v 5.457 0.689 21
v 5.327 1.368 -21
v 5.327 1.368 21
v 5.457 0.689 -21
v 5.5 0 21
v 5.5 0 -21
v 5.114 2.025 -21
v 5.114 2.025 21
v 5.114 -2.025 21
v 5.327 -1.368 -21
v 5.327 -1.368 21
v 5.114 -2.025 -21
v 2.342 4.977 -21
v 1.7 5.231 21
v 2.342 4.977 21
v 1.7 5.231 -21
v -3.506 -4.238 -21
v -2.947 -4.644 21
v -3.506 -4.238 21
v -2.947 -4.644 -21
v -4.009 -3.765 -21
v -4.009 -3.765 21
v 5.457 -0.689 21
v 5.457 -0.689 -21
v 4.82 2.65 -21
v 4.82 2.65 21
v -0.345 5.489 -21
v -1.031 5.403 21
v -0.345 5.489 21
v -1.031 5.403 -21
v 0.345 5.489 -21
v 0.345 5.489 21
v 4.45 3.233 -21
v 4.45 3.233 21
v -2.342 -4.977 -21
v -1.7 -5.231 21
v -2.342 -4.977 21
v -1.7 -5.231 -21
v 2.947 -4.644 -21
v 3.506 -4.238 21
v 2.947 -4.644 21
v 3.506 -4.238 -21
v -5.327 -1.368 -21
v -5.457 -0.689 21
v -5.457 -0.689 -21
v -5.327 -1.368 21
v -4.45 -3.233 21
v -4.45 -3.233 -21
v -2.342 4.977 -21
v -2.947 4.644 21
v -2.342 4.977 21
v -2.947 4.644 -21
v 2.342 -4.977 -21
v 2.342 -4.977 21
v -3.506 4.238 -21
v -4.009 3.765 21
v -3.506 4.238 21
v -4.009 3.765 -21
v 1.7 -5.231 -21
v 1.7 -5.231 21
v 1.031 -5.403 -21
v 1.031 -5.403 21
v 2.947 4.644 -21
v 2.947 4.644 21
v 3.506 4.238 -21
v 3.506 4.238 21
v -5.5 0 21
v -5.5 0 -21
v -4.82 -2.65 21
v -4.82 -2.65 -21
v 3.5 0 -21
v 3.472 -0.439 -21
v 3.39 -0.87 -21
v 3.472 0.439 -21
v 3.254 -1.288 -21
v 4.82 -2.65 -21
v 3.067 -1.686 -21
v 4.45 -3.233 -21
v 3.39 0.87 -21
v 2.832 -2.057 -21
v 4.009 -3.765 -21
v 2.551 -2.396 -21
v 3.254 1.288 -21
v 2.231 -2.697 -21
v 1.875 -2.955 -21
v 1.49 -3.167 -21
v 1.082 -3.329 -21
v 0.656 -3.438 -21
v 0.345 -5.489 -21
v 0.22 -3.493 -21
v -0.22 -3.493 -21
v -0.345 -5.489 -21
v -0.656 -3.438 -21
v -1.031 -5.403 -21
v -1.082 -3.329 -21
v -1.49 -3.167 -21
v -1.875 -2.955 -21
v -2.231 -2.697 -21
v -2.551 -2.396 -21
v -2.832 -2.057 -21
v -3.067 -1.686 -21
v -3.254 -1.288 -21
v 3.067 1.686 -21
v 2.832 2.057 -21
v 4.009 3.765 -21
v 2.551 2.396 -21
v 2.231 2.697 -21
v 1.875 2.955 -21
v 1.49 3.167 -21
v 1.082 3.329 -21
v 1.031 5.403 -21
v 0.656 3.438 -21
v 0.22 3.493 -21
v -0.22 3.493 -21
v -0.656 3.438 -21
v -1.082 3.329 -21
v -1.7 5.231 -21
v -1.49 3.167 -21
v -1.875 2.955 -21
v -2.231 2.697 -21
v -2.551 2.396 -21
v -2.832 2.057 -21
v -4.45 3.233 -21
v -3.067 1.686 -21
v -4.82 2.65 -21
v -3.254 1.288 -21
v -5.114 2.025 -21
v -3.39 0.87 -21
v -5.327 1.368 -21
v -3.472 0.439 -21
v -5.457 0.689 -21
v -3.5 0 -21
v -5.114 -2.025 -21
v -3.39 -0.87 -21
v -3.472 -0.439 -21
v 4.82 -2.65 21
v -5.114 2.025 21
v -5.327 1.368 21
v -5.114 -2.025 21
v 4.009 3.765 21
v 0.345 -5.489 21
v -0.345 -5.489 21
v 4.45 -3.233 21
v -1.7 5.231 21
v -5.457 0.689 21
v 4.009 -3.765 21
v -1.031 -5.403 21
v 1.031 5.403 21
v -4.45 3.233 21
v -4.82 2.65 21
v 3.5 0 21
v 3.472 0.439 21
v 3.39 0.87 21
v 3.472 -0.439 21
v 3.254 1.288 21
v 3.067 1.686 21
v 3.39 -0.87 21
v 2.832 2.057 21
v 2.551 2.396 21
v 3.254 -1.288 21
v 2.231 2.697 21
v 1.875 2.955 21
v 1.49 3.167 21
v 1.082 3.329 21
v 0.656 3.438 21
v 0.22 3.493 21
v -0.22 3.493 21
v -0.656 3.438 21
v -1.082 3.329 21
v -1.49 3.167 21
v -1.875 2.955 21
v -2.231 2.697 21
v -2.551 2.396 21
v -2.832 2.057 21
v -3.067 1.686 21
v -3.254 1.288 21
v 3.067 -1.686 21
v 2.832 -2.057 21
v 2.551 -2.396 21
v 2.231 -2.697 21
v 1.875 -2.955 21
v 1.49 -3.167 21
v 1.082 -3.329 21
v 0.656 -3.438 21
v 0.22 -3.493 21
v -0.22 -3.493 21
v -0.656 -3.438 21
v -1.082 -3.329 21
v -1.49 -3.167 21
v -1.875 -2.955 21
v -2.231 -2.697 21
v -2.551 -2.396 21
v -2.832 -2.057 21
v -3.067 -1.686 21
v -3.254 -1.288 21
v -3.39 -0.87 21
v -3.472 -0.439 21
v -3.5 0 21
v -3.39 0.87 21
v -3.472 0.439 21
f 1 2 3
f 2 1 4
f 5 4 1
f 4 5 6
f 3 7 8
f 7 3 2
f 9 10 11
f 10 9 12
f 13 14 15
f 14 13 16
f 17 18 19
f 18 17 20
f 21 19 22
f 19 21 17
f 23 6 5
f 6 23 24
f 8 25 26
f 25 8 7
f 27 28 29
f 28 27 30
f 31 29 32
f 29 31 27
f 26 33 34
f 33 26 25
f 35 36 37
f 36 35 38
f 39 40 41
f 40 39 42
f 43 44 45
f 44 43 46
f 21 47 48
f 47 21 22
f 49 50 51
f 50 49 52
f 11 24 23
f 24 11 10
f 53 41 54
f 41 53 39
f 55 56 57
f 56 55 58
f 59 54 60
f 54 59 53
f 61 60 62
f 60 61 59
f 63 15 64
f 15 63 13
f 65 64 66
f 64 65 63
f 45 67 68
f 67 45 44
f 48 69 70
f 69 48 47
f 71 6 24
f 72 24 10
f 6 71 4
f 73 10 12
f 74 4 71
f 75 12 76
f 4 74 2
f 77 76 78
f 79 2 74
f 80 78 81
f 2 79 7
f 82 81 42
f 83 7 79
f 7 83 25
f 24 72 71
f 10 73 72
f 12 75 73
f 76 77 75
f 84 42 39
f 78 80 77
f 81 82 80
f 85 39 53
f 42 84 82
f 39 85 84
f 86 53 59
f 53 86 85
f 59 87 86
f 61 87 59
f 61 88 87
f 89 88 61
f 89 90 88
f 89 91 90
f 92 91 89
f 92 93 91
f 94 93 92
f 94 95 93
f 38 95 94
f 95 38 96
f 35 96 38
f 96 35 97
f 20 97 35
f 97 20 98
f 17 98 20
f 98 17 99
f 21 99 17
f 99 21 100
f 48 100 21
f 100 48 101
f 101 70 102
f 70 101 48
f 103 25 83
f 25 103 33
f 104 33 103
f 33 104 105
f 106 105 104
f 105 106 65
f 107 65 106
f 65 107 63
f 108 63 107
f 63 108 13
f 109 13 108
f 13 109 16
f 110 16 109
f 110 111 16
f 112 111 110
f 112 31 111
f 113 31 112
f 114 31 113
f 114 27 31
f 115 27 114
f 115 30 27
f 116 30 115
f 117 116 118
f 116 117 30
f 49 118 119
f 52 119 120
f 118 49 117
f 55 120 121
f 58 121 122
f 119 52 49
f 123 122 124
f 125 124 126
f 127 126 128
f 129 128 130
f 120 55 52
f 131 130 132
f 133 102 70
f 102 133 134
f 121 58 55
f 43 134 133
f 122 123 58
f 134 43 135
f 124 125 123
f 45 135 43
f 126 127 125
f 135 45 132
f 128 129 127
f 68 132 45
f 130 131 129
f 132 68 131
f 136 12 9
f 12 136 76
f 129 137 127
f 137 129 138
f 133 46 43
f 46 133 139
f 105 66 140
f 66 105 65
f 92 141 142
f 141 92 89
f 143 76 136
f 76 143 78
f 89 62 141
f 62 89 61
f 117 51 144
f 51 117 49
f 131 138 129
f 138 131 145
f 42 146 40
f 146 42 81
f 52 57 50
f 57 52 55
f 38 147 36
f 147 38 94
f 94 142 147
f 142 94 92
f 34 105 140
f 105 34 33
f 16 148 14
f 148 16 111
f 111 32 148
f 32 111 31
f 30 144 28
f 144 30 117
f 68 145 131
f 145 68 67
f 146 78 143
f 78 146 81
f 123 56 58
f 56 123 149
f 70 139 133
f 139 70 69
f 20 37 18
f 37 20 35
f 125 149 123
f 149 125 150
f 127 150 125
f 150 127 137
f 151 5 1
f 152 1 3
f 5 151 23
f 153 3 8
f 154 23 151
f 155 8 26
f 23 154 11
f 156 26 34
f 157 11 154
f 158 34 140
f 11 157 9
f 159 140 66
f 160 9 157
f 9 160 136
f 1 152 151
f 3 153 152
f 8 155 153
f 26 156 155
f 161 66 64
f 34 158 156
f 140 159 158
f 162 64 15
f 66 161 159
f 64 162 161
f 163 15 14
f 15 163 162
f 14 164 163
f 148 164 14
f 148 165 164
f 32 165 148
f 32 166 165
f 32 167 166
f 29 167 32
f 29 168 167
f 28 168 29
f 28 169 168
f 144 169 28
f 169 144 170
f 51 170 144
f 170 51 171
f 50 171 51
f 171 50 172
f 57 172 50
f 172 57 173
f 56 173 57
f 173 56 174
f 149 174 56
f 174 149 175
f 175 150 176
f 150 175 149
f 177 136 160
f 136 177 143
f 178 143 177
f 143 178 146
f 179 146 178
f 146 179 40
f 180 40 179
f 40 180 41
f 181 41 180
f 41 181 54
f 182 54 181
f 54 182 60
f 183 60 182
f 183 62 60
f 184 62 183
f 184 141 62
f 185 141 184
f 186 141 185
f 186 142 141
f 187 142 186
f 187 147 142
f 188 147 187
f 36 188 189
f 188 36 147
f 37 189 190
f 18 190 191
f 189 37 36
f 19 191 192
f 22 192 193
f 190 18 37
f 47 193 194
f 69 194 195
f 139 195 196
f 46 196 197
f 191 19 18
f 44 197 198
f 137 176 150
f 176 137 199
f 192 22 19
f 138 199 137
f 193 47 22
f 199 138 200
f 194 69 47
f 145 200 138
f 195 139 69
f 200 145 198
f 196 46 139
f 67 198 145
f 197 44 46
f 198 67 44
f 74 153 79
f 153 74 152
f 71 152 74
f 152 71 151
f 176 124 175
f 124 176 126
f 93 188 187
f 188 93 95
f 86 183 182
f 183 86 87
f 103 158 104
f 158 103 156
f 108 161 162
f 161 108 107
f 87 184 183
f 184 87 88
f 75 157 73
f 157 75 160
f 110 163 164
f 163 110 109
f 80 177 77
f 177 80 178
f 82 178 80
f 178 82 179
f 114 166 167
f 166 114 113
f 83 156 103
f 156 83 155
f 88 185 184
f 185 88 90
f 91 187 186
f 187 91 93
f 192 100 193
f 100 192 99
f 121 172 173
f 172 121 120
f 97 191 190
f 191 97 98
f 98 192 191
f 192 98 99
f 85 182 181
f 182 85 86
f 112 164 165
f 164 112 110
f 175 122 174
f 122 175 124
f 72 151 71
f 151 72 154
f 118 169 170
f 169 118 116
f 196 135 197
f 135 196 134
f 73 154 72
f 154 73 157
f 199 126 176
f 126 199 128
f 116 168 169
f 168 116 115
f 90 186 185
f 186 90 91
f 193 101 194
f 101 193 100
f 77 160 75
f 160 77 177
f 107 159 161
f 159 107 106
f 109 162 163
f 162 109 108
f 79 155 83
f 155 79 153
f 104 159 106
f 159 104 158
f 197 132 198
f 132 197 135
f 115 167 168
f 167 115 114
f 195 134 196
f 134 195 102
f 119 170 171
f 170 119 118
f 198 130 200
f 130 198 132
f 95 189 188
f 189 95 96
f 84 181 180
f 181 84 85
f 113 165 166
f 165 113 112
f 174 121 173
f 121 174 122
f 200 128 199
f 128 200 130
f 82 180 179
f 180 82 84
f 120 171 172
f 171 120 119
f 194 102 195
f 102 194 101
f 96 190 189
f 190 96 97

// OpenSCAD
$fn = 50;


difference() {
	union() {
		translate(v = [0, 0, -21.0000000000]) {
			cylinder(h = 42, r = 5.5000000000);
		}
	}
	union() {
		translate(v = [0, 0, -100.0000000000]) {
			cylinder(h = 200, r = 3.5000000000);
		}
	}
}
